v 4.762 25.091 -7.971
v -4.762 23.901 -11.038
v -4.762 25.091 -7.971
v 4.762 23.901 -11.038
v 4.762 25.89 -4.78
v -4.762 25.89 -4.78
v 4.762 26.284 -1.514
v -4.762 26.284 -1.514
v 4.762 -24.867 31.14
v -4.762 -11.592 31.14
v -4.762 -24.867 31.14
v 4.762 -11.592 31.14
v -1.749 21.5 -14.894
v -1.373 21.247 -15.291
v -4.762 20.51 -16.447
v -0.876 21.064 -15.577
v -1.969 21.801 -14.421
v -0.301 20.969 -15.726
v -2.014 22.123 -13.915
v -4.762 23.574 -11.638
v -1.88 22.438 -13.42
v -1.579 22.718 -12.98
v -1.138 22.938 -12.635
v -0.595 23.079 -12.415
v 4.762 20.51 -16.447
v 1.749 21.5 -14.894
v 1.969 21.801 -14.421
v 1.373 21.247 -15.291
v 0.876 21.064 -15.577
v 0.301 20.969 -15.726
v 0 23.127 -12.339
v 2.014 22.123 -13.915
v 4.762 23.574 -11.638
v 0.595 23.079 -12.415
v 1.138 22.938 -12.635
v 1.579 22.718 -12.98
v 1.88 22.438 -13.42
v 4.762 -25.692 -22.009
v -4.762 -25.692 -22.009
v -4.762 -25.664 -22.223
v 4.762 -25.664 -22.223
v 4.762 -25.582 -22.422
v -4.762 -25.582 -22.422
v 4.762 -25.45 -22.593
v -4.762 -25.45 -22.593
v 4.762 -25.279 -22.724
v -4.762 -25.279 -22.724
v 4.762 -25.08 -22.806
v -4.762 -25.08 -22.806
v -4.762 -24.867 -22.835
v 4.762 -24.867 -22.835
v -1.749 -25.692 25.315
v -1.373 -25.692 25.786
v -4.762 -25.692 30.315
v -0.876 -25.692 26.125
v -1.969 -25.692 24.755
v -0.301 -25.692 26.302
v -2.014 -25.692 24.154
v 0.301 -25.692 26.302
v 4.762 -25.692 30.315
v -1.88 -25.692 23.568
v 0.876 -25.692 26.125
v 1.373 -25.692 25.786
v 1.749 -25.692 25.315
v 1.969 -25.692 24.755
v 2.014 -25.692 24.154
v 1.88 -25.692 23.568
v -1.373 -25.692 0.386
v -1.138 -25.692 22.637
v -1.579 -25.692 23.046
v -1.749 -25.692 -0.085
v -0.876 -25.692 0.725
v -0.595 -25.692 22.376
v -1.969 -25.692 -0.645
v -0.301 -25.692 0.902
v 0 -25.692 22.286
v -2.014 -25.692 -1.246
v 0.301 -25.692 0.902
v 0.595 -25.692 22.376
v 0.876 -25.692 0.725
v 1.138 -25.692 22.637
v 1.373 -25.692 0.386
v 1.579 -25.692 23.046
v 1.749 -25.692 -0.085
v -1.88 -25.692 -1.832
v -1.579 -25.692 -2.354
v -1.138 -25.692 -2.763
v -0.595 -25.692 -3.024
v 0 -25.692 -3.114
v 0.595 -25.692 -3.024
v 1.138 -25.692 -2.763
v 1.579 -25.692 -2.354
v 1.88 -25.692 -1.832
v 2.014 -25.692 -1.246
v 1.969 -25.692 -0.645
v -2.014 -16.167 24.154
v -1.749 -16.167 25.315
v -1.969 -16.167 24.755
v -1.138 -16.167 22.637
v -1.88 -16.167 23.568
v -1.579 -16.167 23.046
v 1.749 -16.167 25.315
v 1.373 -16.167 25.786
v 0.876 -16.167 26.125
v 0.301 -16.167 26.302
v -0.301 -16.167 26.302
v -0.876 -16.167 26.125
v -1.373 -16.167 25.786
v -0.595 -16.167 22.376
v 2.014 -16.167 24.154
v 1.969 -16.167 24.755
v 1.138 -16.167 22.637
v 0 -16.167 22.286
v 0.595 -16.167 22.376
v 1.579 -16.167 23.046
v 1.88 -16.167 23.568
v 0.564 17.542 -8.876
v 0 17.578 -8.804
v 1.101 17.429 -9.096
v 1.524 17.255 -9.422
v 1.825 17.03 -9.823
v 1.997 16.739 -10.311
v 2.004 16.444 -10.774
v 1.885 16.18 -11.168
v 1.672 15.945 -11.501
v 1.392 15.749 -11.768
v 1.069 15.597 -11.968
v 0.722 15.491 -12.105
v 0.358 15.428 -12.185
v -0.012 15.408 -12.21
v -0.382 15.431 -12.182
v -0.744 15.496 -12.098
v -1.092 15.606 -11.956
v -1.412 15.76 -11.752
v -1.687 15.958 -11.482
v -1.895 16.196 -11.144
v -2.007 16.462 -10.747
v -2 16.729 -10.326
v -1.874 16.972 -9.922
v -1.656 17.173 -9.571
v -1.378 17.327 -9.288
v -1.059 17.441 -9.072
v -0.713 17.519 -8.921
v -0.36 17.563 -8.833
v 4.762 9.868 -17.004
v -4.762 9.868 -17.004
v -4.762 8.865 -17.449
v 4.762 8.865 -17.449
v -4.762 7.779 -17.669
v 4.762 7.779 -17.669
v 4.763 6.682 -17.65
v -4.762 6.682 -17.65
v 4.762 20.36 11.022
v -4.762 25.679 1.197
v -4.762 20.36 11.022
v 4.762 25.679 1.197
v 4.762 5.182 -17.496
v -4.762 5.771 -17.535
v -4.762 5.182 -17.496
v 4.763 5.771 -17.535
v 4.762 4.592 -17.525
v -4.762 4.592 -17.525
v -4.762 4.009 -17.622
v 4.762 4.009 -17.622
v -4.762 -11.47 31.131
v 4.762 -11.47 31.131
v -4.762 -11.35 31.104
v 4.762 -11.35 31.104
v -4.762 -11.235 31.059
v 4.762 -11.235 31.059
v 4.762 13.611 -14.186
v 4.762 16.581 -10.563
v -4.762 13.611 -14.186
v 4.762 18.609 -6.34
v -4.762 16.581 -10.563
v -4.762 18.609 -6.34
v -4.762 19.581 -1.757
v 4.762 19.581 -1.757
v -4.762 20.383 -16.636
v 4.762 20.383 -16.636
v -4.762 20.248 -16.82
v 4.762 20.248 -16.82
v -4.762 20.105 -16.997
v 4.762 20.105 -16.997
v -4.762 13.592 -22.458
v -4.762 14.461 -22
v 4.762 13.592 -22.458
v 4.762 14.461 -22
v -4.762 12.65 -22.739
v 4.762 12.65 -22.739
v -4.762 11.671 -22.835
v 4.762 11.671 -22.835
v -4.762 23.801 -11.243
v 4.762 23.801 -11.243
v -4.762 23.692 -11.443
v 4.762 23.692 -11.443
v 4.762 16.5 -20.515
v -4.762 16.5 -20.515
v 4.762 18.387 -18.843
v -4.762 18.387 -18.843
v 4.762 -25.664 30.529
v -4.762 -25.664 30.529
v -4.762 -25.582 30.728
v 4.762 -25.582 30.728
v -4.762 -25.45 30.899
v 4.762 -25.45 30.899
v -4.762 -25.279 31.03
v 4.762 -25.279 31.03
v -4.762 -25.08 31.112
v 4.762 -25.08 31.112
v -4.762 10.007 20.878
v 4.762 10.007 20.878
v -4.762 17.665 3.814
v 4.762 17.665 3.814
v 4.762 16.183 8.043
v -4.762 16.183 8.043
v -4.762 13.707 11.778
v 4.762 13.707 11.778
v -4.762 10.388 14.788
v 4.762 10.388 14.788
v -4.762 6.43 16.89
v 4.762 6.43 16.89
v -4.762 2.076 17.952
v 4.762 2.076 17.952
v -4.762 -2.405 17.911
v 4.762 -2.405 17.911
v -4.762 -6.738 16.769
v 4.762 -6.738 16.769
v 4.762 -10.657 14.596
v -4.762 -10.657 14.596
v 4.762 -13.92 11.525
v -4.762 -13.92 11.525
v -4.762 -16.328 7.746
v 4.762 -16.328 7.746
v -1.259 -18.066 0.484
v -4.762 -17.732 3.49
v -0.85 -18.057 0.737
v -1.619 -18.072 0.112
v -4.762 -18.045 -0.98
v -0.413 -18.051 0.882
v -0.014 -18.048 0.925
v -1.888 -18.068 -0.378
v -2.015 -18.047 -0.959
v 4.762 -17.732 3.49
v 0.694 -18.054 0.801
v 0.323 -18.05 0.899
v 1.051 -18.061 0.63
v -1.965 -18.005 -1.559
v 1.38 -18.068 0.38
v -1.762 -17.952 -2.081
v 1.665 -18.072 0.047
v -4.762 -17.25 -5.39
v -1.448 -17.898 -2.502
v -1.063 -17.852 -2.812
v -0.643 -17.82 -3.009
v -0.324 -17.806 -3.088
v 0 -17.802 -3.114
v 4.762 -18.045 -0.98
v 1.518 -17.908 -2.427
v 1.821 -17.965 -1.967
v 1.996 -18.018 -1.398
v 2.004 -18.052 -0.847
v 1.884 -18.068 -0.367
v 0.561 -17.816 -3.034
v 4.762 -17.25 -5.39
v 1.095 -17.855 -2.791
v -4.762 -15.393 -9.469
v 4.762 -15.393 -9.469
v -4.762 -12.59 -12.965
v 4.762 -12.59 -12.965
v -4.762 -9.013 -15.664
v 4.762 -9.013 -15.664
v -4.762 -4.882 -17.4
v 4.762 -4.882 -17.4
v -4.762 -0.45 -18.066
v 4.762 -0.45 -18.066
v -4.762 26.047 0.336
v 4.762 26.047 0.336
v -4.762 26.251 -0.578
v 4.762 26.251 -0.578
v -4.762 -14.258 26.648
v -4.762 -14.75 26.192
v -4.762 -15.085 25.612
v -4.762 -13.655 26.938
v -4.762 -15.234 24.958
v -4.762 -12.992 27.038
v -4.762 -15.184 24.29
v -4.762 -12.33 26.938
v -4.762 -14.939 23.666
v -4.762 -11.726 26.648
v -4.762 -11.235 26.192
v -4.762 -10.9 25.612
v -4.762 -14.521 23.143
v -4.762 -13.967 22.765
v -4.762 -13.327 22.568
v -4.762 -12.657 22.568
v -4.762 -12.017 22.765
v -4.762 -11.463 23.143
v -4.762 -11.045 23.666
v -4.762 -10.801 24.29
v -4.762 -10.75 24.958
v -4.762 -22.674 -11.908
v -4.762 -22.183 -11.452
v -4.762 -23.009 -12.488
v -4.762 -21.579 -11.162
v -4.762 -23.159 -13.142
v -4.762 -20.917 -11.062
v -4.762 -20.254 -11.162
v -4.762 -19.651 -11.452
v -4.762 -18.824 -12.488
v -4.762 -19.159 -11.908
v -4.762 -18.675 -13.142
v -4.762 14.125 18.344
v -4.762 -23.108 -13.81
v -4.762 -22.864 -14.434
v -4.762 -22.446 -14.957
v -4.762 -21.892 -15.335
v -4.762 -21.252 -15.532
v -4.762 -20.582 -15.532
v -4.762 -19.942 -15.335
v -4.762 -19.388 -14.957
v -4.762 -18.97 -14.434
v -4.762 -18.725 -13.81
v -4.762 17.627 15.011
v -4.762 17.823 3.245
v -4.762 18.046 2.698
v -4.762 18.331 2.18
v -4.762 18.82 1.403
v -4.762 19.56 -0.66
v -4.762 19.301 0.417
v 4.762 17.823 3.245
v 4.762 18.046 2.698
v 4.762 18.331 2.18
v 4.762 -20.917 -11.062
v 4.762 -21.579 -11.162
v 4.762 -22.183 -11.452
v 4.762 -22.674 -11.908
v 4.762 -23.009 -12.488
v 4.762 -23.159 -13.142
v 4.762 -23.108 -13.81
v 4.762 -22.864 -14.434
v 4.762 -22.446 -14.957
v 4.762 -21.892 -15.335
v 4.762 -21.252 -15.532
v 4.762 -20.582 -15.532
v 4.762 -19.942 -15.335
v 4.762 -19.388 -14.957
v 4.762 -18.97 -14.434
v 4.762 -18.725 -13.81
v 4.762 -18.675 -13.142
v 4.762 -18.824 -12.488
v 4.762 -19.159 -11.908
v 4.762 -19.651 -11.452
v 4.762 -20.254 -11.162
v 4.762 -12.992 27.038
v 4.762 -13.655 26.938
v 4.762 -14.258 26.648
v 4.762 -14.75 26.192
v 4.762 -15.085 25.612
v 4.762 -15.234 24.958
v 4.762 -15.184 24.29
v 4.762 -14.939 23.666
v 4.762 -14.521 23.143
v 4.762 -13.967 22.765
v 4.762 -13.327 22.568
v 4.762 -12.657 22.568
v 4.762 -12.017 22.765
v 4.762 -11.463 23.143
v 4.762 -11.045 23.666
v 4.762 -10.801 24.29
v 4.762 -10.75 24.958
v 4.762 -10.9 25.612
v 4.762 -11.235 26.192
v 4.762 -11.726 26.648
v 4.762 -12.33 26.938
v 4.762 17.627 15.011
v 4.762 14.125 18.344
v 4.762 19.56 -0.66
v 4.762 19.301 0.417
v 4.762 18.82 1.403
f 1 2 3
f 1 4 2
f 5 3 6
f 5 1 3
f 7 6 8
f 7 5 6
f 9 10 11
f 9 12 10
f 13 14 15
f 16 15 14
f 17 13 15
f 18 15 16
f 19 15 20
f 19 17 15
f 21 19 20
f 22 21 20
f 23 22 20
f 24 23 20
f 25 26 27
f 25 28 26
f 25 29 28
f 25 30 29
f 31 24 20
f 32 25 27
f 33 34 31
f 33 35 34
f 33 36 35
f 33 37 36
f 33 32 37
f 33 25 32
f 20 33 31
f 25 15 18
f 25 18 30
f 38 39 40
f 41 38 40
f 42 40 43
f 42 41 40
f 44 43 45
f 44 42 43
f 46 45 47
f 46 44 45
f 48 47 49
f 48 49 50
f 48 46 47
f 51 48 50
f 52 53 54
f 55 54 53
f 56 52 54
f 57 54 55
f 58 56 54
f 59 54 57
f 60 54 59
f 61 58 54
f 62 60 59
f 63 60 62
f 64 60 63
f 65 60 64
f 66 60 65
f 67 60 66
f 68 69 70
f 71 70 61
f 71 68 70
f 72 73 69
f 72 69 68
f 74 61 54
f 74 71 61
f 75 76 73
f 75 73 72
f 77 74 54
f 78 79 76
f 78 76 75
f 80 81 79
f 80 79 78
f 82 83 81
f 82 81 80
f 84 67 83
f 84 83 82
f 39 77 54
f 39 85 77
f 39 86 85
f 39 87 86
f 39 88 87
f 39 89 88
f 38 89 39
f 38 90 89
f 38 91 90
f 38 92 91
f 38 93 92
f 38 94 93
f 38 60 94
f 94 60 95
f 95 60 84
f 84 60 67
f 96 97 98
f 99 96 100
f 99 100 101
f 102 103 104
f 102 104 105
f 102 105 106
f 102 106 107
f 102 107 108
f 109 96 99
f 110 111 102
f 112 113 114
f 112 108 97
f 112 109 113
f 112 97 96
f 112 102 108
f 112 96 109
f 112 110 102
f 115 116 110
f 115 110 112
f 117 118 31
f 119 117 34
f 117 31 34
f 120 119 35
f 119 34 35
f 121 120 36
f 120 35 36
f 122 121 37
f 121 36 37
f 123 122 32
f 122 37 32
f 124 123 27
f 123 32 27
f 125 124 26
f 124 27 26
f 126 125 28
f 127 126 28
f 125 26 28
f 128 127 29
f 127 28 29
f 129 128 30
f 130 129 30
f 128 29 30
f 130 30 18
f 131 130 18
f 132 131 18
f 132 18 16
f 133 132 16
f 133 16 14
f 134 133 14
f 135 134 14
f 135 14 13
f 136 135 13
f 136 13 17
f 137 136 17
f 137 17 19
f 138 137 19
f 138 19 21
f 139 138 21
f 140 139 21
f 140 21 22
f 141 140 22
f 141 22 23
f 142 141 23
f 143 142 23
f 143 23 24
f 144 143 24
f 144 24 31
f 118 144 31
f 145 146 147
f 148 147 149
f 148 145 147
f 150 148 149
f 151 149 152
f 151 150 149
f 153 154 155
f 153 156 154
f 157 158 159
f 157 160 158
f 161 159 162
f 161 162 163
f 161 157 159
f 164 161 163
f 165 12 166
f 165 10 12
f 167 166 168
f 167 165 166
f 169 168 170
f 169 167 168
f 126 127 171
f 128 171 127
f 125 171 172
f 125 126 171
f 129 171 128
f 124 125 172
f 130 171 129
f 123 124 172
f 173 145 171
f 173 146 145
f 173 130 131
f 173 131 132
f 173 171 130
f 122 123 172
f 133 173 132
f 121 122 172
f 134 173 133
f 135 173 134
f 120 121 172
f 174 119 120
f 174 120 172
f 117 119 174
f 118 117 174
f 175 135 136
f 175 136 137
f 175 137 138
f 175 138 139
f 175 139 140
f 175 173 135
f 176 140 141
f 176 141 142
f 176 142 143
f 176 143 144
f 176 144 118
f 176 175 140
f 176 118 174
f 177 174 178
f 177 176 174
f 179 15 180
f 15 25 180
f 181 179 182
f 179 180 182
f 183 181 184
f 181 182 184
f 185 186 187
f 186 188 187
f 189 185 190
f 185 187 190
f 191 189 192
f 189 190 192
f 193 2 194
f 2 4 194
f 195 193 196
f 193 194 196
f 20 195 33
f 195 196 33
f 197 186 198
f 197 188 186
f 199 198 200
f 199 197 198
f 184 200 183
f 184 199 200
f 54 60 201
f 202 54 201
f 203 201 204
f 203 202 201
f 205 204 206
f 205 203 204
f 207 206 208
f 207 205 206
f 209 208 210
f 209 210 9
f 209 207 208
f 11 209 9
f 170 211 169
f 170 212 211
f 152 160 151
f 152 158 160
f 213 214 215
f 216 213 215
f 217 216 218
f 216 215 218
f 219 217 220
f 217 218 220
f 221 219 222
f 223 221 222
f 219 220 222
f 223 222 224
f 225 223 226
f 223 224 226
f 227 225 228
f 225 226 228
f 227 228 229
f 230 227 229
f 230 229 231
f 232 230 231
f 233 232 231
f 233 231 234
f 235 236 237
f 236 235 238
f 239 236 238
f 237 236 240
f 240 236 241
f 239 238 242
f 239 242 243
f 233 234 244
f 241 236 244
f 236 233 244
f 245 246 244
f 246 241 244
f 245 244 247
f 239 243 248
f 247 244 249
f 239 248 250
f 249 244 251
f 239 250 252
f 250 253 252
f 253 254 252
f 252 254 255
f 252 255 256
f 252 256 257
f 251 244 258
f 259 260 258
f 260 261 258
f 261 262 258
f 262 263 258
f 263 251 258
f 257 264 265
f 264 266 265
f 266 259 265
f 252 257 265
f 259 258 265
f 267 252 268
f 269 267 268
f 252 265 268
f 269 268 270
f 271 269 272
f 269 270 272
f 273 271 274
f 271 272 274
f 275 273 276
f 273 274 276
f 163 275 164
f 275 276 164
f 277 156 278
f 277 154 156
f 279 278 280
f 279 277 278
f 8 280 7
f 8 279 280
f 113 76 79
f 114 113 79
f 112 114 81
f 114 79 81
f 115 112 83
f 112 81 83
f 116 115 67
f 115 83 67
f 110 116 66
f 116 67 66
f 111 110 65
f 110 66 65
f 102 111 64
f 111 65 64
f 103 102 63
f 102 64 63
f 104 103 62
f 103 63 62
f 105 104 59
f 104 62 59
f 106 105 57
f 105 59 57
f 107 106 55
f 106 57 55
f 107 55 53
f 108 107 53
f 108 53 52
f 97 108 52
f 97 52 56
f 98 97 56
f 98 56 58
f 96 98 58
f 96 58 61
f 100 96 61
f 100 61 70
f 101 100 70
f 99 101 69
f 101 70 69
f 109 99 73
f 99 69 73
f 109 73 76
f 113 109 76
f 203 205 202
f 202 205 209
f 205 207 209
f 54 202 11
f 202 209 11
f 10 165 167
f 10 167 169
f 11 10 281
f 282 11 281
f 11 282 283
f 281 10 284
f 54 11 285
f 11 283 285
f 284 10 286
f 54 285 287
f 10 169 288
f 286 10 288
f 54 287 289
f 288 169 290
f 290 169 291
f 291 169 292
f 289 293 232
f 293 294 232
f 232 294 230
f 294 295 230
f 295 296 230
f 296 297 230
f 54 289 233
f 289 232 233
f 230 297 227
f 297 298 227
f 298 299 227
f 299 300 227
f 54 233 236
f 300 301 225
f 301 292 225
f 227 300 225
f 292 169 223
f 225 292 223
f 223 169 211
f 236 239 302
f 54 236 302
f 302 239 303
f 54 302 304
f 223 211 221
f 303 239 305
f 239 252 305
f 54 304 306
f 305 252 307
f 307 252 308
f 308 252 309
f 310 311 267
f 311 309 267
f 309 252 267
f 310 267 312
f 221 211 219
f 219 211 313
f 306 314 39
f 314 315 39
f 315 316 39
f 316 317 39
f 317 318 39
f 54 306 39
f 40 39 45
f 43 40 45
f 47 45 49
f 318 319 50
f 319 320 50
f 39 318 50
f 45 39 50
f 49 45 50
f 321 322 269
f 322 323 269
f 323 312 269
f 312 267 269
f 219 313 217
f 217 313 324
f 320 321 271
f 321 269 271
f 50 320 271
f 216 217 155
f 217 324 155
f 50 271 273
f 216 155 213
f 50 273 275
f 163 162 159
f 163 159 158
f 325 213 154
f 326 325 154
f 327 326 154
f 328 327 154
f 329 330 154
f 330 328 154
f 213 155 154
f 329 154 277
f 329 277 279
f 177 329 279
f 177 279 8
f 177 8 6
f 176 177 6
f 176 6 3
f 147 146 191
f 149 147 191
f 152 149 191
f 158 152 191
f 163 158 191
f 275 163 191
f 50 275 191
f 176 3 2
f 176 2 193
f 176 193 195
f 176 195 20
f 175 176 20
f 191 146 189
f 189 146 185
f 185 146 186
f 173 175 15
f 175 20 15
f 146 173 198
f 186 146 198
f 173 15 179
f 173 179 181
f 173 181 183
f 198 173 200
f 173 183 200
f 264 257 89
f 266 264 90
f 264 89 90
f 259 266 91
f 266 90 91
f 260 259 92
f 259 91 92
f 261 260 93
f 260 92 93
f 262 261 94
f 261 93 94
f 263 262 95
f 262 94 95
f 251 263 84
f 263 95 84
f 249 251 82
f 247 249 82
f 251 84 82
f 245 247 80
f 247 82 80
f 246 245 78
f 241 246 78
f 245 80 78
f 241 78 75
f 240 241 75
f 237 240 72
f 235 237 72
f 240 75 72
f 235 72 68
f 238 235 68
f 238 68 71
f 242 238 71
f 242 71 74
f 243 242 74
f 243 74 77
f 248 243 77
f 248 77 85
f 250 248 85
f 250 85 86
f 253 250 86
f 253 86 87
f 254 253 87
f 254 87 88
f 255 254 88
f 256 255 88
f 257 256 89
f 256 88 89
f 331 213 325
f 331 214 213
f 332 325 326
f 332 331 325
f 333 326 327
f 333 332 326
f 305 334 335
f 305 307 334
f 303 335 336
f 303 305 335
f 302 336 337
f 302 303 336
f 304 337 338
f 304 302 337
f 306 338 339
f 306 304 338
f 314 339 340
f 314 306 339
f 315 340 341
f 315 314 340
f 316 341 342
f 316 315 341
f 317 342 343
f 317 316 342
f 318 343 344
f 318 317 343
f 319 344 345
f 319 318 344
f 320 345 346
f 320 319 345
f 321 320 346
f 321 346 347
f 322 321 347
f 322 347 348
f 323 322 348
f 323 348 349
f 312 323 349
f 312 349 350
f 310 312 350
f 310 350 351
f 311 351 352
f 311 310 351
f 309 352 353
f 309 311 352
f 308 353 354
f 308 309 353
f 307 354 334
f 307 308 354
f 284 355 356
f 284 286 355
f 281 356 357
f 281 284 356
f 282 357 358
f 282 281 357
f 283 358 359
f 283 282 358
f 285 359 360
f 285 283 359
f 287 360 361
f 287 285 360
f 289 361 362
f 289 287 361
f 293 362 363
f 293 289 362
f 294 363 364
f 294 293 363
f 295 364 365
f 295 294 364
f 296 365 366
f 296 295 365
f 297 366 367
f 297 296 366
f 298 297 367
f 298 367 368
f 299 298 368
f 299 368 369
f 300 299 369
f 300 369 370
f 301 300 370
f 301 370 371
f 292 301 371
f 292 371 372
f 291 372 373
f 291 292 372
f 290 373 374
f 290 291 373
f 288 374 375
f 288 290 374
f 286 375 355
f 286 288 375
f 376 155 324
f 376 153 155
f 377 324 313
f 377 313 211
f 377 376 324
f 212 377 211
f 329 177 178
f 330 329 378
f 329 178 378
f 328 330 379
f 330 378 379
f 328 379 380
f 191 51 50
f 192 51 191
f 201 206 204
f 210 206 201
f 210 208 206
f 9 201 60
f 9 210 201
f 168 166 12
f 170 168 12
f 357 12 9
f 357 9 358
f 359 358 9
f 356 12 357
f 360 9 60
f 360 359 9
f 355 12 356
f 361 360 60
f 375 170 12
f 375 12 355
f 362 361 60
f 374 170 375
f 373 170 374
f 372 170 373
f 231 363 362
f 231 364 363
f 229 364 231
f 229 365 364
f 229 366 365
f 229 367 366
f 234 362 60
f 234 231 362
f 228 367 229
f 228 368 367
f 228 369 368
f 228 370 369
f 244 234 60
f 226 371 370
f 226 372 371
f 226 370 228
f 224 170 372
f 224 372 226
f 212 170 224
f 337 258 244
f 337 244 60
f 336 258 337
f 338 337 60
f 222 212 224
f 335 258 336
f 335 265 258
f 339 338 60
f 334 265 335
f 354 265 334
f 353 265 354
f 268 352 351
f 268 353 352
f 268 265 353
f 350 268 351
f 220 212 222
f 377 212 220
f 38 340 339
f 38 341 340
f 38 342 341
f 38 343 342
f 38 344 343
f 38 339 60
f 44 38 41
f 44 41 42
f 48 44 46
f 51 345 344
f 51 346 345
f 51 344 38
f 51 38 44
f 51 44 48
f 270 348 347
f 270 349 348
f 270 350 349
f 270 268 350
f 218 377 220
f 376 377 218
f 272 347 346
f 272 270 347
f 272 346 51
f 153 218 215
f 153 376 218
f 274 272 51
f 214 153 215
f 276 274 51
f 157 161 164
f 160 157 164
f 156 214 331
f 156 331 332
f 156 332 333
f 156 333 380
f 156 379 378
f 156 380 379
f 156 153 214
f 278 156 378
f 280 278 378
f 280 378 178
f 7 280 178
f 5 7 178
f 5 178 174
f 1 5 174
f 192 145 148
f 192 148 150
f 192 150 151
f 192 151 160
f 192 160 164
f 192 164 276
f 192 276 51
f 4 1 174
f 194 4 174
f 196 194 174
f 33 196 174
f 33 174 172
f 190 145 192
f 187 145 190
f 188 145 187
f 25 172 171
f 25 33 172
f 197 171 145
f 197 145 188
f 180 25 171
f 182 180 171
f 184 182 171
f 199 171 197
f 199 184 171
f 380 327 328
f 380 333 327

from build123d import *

# Parameters (mm, degrees)
SKETCH1_R               = 2.2479
BOSS_EXTRUDE1_DEPTH     = 4.7625
SKETCH2_R               = 2.0193
CUT_EXTRUDE1_DEPTH      = 9.525
FILLET1_R               = 0.8255
FILLET2_R               = 5.08
FILLET3_R               = 5.08
CUT_EXTRUDE2_REACH      = 67.899
CUT_EXTRUDE2_END_RADIUS = 19.6596
SKETCH4_R               = 2.0193


with BuildPart() as part:
    # Sketch1 → Boss-Extrude1 (new, symmetric)
    with BuildSketch(Plane(origin=(0, 0, 0), x_dir=(0, 0, -1), z_dir=(1, 0, 0))):
        with BuildLine():
            Line((-31.1404, -25.6921), (22.8346, -25.6921))
            Line((22.8346, -25.6921), (22.8346, 3.821096341))
            Line((22.8346, 3.821096341), (22.8346, 13.103329243))
            ThreePointArc((22.8346, 13.103329243), (20.105248524, 16.996916667), (16.720065807, 20.336066331))
            Line((16.720065807, 20.336066331), (11.364530126, 23.747918844))
            ThreePointArc((11.364530126, 23.747918844), (5.82676412, 25.674209127), (0, 26.3271))
            Line((0, 26.3271), (-11.022257836, 20.35999918))
            ThreePointArc((-11.022257836, 20.35999918), (-16.769041287, 15.963050734), (-20.8778164, 10.006823511))
            Line((-20.8778164, 10.006823511), (-31.1404, -11.4046))
            Line((-31.1404, -11.4046), (-31.1404, -25.6921))
        make_face()
        with Locations(Location((13.3096, -20.9169, 0), (0, 0, 180))):
            Circle(SKETCH1_R, mode=Mode.SUBTRACT)
        with Locations(Location((-24.7904, -12.9921, 0), (0, 0, 180))):
            Circle(SKETCH1_R, mode=Mode.SUBTRACT)
        with BuildLine():
            Line((0, 19.6596), (0, 18.0721))
            ThreePointArc((0, 18.0721), (-9.710132252, -15.241854548), (16.378884958, 7.637599488))
            Line((16.378884958, 7.637599488), (17.81764857, 8.308505979))
            ThreePointArc((17.81764857, 8.308505979), (10.56309538, 16.580738468), (0, 19.6596))
        make_face(mode=Mode.SUBTRACT)
    extrude(amount=BOSS_EXTRUDE1_DEPTH, both=True)

    # Sketch2 → Cut-Extrude1 (cut)
    with BuildSketch(Plane.XZ.offset(25.6921)):
        with Locations(Location((0, -1.09474, 0), (0, 0, 270))):
            Circle(SKETCH2_R)
        with Locations(Location((0, 24.30526, 0), (0, 0, 270))):
            Circle(SKETCH2_R)
    extrude(amount=-CUT_EXTRUDE1_DEPTH, mode=Mode.SUBTRACT)

    # Fillet1
    fillet1_edges = [part.edges().sort_by_distance(p)[0] for p in [
        (0, -25.6921, -22.8346),
        (0, -25.6921, 31.1404),
        (0, -11.4046, 31.1404),
    ]]
    fillet(fillet1_edges, radius=FILLET1_R)

    # Chamfer1
    # the kernel refuses this chamfer: 3.302, 1.906410589 mm, written as the material it takes off along each edge
    with BuildSketch(Plane(origin=(-12.550145682, 7.637599488, -16.378884958), x_dir=(0, -0.9448116509539838, -0.32761401713236815), z_dir=(1, 0, 0))) as chamfer1_piece_1_section:
        with BuildLine():
            Line((3.115058273, 0), (-0.285434968, 1.681623622))
            Line((-0.285434968, 1.681623622), (-0.351127983, 1.674862743))
            ThreePointArc((-0.351127983, 1.674862743), (-0.152815077, 0.839772605), (-0.065693014, -0.00676088))
            Line((-0.065693014, -0.00676088), (0.00676088, -0.065693014))
            ThreePointArc((0.00676088, -0.065693014), (1.557097323, 0.026529257), (3.110868588, -0.065906966))
            Line((3.110868588, -0.065906966), (3.115058273, 0))
        make_face()
    chamfer1_piece_1 = extrude(amount=25.100291364, mode=Mode.PRIVATE)
    chamfer1_piece_1 = chamfer1_piece_1 & Plane(origin=(0, 0, 0), x_dir=(0, 0.4226182617407049, -0.9063077870366475), z_dir=(1, 0, 0)) * Cylinder(19.6596, 63, mode=Mode.PRIVATE)
    add(chamfer1_piece_1, mode=Mode.SUBTRACT)
    with BuildSketch(Plane(origin=(12.550145682, 18.0721, 0), x_dir=(0, -0.10237552272911479, 0.9947458229849173), z_dir=(-1, 0, 0))) as chamfer1_piece_2_section:
        with BuildLine():
            Line((3.115058273, 0), (-0.285434968, 1.681623622))
            Line((-0.285434968, 1.681623622), (-0.351127983, 1.674862743))
            ThreePointArc((-0.351127983, 1.674862743), (-0.152815077, 0.839772605), (-0.065693014, -0.00676088))
            Line((-0.065693014, -0.00676088), (0.00676088, -0.065693014))
            ThreePointArc((0.00676088, -0.065693014), (1.557097323, 0.026529257), (3.110868588, -0.065906966))
            Line((3.110868588, -0.065906966), (3.115058273, 0))
        make_face()
    chamfer1_piece_2 = extrude(amount=25.100291364, mode=Mode.PRIVATE)
    chamfer1_piece_2 = chamfer1_piece_2 & Plane(origin=(0, 0, 0), x_dir=(0, 0.4226182617407049, -0.9063077870366475), z_dir=(1, 0, 0)) * Cylinder(19.6596, 63, mode=Mode.PRIVATE)
    add(chamfer1_piece_2, mode=Mode.SUBTRACT)

    # Fillet2
    fillet2_edges = [part.edges().sort_by_distance(p)[0] for p in [
        (0, 26.3271, 0),
        (0, 23.747918844, -11.364530126),
        (0, 20.336066331, -16.720065807),
        (0, 13.103329243, -22.8346),
    ]]
    fillet(fillet2_edges, radius=FILLET2_R)

    # Fillet3
    fillet3_edges = [part.edges().sort_by_distance(p)[0] for p in [
        (0, 17.823556008, 2.98691306),
        (0, 4.825497693, -17.415951608),
        (0, 8.2447084, -17.847259049),
        (0, 19.659474186, 0.070334171),
    ]]
    fillet(fillet3_edges, radius=FILLET3_R)

    # Cut-Extrude2: up to this cylinder (the profile starts outside it)
    cut_extrude2_end = Plane(origin=(0, 0, 0), z_dir=(-1, 0, 0)) * Cylinder(CUT_EXTRUDE2_END_RADIUS, 176.1172, mode=Mode.PRIVATE)
    # Sketch4 → Cut-Extrude2 (cut, up to the surface)
    with BuildSketch(Plane(origin=(0, 22.041992588, -14.042297966), x_dir=(1, 0, 0), z_dir=(0, 0.8433914458128872, -0.5372996083468217)), mode=Mode.PRIVATE) as cut_extrude2_sk1:
        with Locations(Location((0, 0, 0), (0, 0, 270))):
            Circle(SKETCH4_R)
    cut_extrude2_tool1 = extrude(cut_extrude2_sk1.sketch, amount=-CUT_EXTRUDE2_REACH, mode=Mode.PRIVATE) - cut_extrude2_end
    add(cut_extrude2_tool1.solids().sort_by_distance((0, 22.041993, -14.042298))[0], mode=Mode.SUBTRACT)


solid = part.part
